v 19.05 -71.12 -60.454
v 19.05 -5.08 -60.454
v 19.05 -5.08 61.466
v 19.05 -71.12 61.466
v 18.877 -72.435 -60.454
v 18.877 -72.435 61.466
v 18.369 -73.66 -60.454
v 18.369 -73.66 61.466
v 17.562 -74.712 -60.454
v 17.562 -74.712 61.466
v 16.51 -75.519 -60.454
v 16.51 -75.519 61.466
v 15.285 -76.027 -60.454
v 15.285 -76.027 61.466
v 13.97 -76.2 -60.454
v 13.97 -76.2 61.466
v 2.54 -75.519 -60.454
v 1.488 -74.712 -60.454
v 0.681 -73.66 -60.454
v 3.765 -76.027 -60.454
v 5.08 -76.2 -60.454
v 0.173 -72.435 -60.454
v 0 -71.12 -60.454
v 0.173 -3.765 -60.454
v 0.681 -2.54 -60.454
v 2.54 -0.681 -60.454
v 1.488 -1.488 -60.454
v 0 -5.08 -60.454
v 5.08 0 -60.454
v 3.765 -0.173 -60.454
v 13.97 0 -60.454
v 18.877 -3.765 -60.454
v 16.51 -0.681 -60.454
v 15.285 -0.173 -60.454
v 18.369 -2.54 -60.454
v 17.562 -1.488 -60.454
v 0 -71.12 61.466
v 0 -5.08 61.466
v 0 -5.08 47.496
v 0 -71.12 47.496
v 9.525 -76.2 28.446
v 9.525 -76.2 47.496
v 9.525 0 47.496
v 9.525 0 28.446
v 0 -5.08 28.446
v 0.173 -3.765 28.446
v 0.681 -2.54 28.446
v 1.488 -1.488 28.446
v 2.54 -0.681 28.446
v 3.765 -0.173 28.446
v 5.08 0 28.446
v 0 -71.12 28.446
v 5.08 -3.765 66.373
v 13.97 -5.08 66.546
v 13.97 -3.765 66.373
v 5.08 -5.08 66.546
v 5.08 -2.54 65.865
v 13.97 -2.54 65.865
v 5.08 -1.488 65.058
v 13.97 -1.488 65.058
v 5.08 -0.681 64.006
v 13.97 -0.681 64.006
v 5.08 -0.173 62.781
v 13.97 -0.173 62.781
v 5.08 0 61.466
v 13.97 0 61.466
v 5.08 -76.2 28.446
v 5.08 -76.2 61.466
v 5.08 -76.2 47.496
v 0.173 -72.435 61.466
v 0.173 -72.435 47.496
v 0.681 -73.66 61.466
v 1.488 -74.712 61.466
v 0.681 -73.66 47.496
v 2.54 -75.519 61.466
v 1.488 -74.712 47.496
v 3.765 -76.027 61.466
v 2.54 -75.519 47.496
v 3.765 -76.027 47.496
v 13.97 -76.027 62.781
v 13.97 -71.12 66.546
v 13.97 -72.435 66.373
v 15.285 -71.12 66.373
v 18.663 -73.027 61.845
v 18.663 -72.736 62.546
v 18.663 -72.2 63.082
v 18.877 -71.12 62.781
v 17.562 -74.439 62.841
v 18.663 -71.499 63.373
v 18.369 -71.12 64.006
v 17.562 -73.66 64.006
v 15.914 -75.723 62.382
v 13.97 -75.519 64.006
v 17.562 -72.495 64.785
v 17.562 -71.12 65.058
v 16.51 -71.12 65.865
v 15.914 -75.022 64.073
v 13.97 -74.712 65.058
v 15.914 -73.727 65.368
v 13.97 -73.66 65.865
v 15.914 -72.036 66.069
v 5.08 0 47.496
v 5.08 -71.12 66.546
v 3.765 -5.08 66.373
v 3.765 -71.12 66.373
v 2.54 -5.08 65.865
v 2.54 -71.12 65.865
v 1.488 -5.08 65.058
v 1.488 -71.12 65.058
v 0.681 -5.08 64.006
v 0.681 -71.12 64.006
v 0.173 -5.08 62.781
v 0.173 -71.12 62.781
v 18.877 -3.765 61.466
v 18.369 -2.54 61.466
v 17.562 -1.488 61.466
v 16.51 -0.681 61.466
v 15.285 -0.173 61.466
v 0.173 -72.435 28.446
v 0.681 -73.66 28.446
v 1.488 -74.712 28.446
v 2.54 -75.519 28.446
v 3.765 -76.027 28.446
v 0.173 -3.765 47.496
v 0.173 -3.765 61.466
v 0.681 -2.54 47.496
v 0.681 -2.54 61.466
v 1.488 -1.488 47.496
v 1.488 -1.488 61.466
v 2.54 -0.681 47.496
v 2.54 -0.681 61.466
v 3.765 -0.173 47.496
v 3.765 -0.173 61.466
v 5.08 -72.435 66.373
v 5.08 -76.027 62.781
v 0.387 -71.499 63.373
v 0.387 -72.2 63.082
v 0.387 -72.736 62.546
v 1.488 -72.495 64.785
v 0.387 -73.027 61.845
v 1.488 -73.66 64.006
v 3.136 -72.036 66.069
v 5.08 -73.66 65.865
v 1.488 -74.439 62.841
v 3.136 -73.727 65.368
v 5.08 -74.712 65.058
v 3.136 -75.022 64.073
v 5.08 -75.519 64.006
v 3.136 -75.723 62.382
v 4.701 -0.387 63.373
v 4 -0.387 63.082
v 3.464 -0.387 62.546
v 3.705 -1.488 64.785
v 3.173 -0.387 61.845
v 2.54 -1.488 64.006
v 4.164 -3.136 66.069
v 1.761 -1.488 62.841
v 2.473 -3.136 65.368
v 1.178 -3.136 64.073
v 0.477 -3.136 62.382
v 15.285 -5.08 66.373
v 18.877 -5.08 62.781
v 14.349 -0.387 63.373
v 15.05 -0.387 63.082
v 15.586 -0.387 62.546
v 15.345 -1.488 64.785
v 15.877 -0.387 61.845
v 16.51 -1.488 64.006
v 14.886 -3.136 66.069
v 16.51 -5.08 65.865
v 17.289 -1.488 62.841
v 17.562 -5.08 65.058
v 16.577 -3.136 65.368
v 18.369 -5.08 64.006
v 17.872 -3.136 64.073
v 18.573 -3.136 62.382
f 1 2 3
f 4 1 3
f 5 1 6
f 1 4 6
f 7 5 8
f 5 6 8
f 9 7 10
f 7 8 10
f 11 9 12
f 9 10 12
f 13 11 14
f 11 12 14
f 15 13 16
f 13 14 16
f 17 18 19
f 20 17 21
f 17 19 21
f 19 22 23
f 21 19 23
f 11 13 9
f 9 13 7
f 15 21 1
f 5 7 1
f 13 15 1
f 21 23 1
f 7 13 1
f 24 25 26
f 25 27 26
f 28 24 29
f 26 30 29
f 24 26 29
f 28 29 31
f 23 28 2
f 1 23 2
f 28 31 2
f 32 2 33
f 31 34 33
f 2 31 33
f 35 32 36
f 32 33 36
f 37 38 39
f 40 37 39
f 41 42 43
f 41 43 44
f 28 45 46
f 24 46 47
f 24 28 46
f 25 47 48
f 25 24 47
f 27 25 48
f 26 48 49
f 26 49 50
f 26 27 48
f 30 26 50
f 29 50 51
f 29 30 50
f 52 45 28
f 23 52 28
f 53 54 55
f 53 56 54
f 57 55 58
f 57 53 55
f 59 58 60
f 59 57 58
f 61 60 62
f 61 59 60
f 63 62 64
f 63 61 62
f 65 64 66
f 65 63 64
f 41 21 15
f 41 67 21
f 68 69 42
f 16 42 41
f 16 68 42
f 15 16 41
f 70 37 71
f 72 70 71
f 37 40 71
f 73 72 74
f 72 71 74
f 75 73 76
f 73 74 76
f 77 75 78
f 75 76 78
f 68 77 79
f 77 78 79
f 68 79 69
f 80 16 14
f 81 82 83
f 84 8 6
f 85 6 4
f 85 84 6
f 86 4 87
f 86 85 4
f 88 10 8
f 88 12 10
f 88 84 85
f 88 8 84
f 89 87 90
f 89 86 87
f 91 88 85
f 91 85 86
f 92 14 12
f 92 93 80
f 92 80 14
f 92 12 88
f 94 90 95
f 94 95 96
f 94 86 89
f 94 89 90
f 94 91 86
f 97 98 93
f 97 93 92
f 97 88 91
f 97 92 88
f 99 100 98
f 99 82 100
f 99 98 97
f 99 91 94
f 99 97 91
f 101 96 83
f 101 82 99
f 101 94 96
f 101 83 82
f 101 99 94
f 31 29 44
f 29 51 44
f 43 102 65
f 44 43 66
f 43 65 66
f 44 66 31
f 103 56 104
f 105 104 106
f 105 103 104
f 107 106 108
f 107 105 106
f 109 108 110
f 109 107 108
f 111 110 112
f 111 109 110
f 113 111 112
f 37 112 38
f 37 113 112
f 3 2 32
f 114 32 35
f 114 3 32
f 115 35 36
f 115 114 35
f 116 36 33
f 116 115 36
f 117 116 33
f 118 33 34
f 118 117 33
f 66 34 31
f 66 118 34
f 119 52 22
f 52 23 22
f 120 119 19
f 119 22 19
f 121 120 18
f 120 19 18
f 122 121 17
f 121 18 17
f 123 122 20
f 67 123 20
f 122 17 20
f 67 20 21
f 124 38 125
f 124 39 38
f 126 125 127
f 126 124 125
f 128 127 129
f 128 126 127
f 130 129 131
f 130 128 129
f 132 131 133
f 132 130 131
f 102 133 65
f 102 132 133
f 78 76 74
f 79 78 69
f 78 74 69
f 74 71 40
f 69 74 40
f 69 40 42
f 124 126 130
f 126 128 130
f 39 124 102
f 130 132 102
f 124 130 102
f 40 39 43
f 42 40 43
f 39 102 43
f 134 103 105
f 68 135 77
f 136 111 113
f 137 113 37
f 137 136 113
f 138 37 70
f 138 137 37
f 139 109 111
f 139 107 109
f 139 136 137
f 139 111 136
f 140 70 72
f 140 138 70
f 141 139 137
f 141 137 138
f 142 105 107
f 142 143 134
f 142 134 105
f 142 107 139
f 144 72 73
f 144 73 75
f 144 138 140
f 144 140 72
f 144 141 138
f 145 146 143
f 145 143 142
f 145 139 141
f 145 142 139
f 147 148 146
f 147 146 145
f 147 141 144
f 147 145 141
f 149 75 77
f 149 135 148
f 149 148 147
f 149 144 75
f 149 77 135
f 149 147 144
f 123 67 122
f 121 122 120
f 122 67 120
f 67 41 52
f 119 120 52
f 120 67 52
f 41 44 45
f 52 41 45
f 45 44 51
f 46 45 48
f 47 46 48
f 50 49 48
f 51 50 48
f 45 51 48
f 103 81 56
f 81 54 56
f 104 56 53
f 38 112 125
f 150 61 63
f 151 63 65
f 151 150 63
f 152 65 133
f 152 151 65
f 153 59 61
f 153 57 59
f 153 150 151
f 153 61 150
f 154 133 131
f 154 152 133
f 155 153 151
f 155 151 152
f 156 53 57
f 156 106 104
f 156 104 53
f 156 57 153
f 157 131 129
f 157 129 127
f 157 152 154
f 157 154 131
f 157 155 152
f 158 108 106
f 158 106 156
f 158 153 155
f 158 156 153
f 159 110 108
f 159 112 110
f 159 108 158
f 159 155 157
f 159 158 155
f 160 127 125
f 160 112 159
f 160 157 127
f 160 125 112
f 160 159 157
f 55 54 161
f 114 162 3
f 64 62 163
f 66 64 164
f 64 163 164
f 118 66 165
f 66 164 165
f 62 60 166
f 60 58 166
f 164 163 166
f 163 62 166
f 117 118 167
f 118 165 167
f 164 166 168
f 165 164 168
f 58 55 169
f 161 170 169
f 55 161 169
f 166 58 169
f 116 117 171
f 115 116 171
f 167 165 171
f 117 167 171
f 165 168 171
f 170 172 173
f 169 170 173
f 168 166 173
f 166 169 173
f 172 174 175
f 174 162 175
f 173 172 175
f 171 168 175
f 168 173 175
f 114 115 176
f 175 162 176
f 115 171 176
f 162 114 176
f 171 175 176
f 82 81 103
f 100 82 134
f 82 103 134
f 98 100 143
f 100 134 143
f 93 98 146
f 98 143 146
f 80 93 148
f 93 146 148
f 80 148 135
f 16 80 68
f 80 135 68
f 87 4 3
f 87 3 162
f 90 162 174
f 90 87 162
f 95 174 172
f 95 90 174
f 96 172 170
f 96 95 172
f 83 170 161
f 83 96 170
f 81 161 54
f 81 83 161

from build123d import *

# Parameters (mm, degrees)
F1_DEPTH = 76.2
F2_R     = 5.08


with BuildPart() as f1:
    # F0 (on Front) → F1 (new body)
    with BuildSketch(Plane.XZ):
        Polygon((0, 28.445911), (0, -60.454089), (19.05, -60.454089), (19.05, 66.545911), (0, 66.545911), (0, 47.495911), (9.525, 47.495911), (9.525, 28.445911), align=None)
    extrude(amount=F1_DEPTH)

    # F2
    f2_edges = [f1.edges().sort_by_distance(p)[0] for p in [
        (0, -76.2, -16.004089),
        (0, 0, -16.004089),
        (9.525, -76.2, 66.545911),
        (0, -38.1, 66.545911),
        (19.05, -76.2, 3.045911),
        (19.05, -38.1, 66.545911),
        (9.525, 0, 66.545911),
        (19.05, 0, 3.045911),
        (0, 0, 57.020911),
        (0, -76.2, 57.020911),
    ]]
    fillet(f2_edges, radius=F2_R)


solid = f1.part
